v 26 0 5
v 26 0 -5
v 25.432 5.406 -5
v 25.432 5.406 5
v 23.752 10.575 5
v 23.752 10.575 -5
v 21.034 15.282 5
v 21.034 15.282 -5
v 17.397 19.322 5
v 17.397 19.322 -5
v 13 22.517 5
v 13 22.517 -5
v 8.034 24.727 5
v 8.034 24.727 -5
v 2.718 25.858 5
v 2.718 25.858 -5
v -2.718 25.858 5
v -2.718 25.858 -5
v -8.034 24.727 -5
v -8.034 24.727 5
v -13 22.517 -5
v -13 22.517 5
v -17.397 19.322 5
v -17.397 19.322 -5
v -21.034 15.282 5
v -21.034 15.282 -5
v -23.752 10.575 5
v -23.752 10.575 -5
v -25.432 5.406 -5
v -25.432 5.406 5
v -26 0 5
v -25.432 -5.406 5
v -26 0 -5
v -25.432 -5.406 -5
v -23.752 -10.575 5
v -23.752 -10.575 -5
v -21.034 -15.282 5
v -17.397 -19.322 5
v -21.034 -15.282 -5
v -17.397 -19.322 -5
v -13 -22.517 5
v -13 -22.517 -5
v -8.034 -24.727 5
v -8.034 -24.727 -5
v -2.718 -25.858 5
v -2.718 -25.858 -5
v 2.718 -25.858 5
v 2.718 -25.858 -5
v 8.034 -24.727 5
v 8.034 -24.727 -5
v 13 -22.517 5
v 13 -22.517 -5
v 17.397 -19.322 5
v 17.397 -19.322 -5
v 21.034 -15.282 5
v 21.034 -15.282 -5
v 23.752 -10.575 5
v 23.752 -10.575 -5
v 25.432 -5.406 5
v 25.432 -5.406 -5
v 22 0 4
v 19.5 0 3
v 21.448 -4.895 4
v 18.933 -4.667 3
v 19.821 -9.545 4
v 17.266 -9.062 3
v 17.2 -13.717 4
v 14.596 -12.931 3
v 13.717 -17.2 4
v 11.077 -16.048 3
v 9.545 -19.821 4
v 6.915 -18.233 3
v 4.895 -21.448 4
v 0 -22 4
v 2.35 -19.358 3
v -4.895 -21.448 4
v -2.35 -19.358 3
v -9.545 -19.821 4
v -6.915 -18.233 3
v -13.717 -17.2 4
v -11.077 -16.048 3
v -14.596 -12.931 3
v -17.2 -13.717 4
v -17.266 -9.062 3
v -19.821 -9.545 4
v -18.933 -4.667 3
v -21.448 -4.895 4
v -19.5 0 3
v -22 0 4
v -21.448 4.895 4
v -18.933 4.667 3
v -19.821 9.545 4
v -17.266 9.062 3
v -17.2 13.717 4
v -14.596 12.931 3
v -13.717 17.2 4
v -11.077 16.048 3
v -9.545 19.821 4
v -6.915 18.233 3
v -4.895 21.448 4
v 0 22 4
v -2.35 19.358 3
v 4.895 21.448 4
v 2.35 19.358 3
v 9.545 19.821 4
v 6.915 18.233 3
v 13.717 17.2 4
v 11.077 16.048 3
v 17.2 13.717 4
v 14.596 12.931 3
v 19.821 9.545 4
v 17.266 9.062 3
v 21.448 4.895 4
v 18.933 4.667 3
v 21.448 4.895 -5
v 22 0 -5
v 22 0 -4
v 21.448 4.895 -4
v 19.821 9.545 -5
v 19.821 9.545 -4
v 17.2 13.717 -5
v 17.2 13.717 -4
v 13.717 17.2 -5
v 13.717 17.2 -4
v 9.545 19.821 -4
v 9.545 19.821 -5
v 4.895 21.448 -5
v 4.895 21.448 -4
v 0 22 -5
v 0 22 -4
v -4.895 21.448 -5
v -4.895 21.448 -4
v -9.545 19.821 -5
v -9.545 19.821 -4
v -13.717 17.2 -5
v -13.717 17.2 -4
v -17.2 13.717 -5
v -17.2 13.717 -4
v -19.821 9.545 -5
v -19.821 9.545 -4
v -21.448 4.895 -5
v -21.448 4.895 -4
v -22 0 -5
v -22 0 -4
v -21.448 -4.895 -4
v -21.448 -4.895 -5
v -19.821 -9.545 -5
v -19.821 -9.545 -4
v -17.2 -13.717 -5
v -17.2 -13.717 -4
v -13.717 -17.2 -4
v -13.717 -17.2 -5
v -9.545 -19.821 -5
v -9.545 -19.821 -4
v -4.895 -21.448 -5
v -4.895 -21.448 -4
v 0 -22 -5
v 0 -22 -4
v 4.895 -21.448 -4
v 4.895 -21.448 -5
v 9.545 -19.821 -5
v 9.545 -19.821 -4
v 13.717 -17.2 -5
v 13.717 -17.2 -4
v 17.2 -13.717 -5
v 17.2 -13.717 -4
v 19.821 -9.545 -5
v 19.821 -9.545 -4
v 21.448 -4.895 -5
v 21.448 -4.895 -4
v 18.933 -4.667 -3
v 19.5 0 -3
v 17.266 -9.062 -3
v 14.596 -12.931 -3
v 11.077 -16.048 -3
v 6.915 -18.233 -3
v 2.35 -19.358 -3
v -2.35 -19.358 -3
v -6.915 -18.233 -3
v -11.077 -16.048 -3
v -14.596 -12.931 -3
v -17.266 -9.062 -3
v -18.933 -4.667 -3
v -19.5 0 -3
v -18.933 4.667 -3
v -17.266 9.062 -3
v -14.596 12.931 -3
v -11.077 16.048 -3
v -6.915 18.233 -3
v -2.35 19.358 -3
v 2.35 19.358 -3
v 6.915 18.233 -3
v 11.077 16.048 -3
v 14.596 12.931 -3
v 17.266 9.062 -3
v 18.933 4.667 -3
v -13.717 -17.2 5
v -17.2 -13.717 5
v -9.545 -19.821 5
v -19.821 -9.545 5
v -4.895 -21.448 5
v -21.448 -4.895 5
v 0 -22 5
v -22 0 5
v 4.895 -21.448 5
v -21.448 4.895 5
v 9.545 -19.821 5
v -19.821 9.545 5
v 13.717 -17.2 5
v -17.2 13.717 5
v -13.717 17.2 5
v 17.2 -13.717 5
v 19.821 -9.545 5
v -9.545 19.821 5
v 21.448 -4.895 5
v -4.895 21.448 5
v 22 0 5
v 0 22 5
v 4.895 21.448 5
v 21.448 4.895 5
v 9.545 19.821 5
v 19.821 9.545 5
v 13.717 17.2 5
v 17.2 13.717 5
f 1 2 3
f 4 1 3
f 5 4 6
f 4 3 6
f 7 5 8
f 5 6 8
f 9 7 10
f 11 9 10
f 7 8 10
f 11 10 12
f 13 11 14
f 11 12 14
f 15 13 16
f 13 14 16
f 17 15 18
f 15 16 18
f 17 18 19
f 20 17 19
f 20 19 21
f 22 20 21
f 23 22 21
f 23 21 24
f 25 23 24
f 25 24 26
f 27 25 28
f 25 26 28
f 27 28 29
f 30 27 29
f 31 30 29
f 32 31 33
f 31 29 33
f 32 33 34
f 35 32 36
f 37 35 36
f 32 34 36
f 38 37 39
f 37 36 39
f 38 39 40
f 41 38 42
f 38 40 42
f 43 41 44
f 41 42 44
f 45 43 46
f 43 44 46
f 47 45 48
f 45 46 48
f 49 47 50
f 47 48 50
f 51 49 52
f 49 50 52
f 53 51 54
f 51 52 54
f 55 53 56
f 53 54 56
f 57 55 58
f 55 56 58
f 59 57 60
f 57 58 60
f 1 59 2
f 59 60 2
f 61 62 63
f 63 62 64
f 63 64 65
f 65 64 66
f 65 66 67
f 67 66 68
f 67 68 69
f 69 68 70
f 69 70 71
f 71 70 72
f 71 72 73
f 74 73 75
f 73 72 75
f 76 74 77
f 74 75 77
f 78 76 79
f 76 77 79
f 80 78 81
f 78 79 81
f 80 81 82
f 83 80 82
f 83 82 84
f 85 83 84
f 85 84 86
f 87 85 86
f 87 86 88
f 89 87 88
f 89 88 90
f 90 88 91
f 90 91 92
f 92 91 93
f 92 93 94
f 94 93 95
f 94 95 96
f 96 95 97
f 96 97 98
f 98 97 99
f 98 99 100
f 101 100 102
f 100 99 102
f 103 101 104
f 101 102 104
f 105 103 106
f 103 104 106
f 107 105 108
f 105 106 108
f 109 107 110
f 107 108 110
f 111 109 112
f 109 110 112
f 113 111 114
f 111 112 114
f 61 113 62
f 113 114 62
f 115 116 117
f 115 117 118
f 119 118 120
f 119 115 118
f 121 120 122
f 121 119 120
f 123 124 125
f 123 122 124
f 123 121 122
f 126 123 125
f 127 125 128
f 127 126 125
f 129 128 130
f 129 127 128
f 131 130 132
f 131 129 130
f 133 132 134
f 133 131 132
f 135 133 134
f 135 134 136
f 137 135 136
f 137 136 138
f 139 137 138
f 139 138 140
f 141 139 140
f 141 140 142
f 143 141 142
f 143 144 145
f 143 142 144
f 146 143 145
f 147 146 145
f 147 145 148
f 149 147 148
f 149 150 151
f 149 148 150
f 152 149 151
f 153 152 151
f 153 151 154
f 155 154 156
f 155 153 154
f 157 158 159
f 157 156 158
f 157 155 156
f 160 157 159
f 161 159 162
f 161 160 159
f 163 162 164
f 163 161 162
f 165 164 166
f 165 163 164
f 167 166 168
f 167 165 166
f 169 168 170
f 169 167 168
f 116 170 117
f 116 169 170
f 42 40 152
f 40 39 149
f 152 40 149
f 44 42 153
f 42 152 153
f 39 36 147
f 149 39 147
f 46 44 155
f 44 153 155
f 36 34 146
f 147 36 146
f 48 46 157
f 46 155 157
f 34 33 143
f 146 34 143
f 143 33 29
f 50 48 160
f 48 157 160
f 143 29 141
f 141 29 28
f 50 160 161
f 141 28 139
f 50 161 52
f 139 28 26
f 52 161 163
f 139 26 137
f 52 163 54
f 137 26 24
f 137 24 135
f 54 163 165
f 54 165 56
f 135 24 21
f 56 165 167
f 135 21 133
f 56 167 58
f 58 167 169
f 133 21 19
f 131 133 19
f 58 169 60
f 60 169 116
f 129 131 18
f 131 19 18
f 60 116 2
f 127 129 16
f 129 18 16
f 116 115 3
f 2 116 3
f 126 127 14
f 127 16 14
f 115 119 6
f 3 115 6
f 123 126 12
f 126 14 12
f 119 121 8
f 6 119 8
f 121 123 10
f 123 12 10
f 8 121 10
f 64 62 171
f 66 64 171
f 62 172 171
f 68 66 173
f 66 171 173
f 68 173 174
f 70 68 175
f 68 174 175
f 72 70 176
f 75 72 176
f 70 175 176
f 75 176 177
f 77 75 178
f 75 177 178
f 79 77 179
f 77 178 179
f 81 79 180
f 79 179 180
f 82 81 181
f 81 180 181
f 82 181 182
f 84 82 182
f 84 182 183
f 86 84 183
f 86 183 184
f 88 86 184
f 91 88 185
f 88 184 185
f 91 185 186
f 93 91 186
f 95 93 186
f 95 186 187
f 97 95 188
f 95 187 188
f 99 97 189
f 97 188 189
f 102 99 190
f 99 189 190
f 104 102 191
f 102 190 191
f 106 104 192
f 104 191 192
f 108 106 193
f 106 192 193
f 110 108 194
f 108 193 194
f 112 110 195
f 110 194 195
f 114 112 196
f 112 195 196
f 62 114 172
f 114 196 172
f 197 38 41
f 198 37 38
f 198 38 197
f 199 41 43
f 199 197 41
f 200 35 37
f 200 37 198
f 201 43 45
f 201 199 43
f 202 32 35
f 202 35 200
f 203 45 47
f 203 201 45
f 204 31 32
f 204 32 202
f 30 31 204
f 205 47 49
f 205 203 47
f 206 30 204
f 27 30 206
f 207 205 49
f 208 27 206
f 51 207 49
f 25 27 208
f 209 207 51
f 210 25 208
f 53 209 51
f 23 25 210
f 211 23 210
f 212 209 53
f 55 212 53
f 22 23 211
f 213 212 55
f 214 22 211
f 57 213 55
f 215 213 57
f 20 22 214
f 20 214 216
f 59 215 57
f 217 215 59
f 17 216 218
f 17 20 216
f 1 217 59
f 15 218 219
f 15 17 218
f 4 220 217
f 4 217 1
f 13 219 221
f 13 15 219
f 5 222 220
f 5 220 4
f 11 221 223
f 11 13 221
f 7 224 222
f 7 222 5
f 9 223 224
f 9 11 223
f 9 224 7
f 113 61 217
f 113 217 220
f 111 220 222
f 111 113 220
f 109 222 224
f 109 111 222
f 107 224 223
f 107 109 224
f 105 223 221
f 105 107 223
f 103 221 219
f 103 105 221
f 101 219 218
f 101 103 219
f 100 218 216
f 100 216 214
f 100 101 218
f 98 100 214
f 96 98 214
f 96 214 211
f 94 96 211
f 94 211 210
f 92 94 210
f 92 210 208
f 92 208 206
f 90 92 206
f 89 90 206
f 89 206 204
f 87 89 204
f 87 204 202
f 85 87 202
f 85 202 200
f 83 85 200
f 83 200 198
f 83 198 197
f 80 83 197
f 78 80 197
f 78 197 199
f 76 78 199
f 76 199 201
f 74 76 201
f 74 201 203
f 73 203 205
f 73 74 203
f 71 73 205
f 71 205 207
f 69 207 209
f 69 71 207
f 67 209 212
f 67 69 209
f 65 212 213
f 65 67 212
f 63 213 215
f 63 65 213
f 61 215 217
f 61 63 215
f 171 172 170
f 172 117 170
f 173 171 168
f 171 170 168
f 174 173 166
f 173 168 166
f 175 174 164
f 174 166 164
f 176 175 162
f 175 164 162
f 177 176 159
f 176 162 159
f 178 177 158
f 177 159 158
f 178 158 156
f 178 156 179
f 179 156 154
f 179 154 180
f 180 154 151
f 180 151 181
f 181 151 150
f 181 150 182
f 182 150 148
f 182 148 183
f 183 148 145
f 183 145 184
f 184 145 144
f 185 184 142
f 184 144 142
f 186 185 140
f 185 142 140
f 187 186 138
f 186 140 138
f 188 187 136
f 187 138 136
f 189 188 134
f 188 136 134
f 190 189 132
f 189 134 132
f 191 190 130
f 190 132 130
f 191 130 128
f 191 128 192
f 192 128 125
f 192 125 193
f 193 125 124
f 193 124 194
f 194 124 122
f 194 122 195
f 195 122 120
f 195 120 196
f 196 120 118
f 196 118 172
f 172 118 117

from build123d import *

# Parameters (mm, degrees)
EXTRUDE_1_DEPTH      = 5
EXTRUDE_1_DEPTH_BACK = 5
SKETCH_1_R           = 26
SKETCH_1_R_2         = 22


with BuildPart() as part:
    # Эскиз1 → Бобышка-Вытянуть1 (new, two sides: drawn at the far end of the back side and taken through both)
    with BuildSketch(Plane.XY.offset(-EXTRUDE_1_DEPTH_BACK)):
        Circle(SKETCH_1_R)
        Circle(SKETCH_1_R_2, mode=Mode.SUBTRACT)
    extrude(amount=EXTRUDE_1_DEPTH + EXTRUDE_1_DEPTH_BACK)

    # Эскиз5 → Повернуть2 (revolve)
    with BuildSketch(Plane(origin=(0, 0, 0), x_dir=(0, 0, -1), z_dir=(1, 0, 0))):
        Polygon((-3, 19.5), (3, 19.5), (4, 22), (-4, 22), align=None)
    revolve(axis=Axis((0, 0, 5), (0, 0, -1)))


solid = part.part
